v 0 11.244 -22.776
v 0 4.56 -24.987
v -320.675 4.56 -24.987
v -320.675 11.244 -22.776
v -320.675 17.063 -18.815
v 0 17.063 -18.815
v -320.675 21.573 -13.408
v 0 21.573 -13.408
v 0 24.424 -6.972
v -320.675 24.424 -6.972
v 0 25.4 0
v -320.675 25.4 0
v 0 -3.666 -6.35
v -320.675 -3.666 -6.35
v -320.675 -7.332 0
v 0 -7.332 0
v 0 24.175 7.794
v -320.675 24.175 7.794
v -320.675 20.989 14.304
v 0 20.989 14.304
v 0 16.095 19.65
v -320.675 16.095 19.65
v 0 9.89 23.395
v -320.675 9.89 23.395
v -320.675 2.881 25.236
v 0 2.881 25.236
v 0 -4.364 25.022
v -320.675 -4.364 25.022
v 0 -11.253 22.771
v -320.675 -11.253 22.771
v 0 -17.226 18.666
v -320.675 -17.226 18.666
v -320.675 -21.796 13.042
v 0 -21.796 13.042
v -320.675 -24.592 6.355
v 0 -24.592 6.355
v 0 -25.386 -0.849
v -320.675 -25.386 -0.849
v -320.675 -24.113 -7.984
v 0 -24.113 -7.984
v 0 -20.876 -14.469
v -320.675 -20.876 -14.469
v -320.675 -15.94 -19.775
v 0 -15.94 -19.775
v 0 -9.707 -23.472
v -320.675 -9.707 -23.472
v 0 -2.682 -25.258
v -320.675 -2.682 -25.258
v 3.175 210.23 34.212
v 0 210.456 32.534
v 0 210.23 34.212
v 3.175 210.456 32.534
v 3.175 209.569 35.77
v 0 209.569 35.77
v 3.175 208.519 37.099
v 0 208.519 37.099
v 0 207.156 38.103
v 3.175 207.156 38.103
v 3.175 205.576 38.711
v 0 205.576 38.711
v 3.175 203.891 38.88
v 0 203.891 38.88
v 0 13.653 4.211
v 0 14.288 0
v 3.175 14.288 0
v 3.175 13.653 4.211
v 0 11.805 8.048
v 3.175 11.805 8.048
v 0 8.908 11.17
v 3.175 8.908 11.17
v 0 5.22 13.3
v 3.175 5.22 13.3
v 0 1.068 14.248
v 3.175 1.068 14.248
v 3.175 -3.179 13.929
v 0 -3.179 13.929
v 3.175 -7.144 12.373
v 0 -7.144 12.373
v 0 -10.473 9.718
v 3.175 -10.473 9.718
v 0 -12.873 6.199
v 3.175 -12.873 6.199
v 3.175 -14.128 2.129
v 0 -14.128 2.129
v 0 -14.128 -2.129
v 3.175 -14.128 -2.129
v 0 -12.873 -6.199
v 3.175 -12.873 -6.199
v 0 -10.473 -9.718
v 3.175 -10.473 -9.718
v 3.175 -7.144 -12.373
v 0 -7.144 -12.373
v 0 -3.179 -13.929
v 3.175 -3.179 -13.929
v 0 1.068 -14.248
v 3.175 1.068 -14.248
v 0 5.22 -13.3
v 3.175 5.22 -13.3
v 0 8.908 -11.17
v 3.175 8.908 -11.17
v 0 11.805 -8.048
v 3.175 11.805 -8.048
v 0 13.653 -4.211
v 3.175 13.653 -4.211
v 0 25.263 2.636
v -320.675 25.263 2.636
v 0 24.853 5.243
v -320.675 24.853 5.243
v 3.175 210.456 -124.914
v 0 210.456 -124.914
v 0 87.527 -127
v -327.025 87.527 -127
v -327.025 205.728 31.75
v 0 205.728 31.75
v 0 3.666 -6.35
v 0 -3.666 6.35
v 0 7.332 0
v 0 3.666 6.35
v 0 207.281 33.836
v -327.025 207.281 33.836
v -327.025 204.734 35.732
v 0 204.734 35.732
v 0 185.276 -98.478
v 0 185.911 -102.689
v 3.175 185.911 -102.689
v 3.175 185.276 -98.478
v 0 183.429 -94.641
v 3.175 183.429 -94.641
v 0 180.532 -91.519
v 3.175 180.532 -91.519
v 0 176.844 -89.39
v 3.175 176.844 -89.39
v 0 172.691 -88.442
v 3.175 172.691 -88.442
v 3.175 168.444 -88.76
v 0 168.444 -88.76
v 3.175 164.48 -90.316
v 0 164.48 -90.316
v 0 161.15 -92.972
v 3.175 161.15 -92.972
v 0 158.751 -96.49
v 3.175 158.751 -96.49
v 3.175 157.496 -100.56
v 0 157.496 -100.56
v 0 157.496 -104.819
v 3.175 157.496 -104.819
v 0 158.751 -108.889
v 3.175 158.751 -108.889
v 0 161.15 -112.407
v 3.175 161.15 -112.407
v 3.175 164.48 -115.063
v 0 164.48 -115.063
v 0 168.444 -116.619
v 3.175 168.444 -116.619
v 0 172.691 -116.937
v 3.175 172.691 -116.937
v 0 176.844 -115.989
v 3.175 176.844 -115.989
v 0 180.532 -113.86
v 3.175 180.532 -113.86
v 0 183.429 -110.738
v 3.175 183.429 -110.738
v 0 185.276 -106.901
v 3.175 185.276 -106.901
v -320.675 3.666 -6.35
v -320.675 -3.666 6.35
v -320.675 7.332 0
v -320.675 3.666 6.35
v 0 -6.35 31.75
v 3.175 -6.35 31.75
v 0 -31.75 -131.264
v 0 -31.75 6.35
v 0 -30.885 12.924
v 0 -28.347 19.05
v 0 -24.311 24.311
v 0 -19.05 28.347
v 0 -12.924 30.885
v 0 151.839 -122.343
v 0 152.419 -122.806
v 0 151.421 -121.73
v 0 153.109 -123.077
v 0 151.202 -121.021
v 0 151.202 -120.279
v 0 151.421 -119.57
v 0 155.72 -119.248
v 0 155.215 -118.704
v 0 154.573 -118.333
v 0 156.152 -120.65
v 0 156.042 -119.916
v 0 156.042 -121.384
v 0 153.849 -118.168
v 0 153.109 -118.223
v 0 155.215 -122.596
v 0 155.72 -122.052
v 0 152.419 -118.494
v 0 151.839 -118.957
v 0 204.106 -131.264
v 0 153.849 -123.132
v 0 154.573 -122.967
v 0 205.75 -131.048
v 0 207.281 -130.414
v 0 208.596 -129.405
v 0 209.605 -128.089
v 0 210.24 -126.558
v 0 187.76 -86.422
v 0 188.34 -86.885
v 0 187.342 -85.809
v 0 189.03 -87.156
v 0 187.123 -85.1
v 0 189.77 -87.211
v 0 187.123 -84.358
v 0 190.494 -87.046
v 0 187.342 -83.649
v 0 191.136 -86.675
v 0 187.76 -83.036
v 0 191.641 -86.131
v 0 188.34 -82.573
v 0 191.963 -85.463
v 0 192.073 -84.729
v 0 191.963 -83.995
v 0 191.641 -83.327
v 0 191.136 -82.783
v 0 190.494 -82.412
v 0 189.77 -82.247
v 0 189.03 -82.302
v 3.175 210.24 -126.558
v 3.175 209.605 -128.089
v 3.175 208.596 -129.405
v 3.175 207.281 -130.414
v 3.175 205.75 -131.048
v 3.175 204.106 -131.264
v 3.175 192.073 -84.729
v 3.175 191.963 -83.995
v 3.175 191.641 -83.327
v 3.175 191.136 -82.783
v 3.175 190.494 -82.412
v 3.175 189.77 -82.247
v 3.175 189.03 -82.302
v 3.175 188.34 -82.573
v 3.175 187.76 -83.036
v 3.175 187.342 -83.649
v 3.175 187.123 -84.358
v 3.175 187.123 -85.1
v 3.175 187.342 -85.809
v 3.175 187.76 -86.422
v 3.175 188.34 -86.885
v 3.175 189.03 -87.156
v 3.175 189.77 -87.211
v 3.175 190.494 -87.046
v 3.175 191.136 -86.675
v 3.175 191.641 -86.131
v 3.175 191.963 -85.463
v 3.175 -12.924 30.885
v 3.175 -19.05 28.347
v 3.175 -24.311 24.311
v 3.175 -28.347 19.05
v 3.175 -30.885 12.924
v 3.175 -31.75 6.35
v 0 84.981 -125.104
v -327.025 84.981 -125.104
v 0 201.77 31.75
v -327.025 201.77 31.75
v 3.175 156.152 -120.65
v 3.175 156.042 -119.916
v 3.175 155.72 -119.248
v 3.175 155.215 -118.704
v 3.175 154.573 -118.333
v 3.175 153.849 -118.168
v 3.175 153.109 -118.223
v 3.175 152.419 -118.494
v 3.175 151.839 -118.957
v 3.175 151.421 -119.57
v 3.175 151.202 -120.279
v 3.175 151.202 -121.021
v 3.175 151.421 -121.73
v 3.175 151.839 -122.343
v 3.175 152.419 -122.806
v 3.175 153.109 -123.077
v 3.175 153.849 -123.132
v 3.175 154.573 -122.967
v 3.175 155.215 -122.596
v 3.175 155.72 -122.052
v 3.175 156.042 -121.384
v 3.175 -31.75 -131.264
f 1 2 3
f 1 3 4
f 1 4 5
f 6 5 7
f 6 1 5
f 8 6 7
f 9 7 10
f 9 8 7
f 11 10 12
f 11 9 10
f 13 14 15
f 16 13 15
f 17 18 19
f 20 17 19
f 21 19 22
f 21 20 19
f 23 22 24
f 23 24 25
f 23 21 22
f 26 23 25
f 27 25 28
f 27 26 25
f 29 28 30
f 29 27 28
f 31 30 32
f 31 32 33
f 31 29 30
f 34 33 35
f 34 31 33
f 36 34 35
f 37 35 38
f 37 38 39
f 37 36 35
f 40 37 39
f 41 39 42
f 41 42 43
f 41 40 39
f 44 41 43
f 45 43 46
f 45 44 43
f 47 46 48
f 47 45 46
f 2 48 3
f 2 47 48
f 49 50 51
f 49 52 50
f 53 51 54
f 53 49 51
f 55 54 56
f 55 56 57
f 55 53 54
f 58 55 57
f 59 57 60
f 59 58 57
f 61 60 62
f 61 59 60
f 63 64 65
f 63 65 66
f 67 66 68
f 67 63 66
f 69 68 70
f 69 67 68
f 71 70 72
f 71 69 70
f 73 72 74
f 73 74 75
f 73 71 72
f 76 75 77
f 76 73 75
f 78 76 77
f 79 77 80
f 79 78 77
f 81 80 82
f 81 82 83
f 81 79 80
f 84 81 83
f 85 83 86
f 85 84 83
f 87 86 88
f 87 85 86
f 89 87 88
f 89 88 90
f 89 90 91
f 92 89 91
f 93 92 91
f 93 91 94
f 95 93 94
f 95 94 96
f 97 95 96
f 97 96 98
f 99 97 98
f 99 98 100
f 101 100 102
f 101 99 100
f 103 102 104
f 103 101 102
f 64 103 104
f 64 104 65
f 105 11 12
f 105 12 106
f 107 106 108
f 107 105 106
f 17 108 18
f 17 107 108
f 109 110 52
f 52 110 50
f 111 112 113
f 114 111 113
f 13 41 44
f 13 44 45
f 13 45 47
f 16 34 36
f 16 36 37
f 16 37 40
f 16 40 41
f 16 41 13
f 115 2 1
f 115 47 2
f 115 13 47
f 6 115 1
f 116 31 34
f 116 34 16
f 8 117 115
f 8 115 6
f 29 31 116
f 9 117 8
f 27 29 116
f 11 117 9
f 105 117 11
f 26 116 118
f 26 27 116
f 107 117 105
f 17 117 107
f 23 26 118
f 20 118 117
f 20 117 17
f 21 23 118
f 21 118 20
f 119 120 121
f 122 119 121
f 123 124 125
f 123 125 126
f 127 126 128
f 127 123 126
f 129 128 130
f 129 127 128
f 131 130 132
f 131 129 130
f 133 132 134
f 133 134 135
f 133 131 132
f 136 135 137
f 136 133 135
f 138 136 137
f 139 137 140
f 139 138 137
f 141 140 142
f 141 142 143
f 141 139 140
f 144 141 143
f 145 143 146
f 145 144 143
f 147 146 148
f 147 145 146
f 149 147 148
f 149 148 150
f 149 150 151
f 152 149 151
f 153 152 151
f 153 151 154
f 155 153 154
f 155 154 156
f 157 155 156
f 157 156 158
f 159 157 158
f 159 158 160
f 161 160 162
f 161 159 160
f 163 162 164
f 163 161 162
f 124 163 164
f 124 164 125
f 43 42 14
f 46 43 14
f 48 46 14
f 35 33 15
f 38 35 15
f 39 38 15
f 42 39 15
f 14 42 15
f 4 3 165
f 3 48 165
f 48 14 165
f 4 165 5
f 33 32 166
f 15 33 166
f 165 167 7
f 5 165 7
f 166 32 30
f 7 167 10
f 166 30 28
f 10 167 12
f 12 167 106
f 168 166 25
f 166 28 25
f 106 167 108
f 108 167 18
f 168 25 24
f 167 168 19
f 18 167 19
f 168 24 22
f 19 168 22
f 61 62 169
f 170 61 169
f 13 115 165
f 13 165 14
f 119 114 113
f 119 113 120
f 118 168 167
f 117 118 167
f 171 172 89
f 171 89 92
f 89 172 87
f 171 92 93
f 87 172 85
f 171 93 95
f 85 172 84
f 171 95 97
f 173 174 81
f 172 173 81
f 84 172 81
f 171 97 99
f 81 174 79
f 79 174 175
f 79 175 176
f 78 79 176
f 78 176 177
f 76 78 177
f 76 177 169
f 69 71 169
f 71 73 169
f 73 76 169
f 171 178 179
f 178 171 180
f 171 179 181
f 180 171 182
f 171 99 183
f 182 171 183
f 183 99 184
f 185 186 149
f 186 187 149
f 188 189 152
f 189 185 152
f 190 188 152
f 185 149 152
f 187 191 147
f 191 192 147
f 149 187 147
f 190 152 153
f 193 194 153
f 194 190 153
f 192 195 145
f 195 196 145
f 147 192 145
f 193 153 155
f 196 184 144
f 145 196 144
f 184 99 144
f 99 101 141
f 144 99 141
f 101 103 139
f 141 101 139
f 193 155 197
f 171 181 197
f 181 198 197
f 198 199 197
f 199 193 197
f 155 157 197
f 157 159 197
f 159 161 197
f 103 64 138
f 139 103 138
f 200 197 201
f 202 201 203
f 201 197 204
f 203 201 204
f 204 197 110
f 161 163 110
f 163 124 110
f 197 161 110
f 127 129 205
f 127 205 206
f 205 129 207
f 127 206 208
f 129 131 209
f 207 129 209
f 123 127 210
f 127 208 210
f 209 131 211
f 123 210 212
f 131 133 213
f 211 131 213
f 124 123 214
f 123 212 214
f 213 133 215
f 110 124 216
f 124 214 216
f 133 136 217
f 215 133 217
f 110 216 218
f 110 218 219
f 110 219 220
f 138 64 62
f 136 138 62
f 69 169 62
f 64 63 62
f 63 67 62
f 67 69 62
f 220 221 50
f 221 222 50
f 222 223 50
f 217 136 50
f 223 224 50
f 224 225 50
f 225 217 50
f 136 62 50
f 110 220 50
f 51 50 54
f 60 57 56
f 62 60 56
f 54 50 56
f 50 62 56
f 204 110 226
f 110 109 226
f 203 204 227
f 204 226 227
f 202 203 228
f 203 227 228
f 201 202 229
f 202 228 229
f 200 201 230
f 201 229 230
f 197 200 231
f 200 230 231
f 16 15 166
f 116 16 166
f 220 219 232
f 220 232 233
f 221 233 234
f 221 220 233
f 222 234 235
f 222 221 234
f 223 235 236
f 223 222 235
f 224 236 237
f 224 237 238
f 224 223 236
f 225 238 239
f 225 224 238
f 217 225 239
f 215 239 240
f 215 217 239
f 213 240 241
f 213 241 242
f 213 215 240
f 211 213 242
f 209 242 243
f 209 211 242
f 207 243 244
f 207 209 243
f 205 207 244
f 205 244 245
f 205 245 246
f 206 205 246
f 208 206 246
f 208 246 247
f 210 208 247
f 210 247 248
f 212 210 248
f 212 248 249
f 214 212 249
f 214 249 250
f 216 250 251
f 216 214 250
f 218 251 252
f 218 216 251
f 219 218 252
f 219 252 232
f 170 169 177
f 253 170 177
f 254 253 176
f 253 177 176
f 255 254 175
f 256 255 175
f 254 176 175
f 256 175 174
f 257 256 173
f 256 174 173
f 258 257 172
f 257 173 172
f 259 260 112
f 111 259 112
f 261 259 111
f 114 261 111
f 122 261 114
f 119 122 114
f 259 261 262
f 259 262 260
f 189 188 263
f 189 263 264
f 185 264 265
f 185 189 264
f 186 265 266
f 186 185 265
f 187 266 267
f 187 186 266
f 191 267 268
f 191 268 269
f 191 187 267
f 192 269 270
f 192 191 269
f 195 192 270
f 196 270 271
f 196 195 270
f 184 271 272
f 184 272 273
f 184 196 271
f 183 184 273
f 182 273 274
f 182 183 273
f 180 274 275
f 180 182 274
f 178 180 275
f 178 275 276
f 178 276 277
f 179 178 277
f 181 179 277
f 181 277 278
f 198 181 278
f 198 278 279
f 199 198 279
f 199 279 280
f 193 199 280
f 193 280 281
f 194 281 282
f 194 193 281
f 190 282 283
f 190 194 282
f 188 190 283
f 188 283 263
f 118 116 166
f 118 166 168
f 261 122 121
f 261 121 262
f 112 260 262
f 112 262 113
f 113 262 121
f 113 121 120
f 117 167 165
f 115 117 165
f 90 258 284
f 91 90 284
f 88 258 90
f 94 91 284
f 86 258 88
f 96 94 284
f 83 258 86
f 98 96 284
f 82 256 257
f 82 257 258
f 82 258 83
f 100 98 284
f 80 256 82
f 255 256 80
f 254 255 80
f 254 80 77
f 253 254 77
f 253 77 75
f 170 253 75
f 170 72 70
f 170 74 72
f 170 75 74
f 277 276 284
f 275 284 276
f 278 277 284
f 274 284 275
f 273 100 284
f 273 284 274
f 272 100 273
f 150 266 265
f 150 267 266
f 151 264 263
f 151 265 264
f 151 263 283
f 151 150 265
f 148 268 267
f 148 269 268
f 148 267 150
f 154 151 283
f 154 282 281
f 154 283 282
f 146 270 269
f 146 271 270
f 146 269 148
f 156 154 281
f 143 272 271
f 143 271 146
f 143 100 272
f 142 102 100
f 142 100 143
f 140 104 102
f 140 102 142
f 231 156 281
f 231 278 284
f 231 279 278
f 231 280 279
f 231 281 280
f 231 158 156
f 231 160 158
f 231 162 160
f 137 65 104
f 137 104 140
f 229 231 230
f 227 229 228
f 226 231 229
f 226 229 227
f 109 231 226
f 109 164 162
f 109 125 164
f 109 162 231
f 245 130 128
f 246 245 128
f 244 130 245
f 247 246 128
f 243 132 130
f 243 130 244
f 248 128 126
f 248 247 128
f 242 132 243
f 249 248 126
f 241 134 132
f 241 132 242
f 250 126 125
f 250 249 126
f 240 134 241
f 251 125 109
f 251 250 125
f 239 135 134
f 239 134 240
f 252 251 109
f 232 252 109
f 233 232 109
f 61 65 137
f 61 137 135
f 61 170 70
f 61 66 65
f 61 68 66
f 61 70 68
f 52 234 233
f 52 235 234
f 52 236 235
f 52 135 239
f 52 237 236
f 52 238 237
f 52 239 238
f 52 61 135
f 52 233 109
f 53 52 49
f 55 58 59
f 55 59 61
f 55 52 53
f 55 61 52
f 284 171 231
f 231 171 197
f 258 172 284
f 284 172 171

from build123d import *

# Parameters (mm, degrees)
F0_R     = 2.4892
F0_R_2   = 14.2875
F1_DEPTH = 3.175
F2_DEPTH = 320.675
F3_DEPTH = 327.025
F5_R     = 6.35


# Not quite as in the source:
# - the program builds the solid bodies; features that only make, move or delete a surface that nothing else refers to are left out


with BuildPart() as f1:
    # F0 (on Right) → F1 (new body)
    with BuildSketch(Plane.YZ):
        with BuildLine():
            ThreePointArc((4.5600132785, -24.9873223635), (-21.7962589324, 13.0415910284), (24.1745661853, 7.7942510707))
            Line((24.1745661853, 7.7942510707), (134.6951456058, -58.3347209468))
            Line((134.6951456058, -58.3347209468), (201.7698075546, 31.75))
            Line((201.7698075546, 31.75), (-6.35, 31.75))
            ThreePointArc((-6.35, 31.75), (-24.3105122421, 24.3105122421), (-31.75, 6.35))
            Line((-31.75, 6.35), (-31.75, -131.2644877579))
            Line((-31.75, -131.2644877579), (210.4560597146, -131.2644877579))
            Line((210.4560597146, -131.2644877579), (210.4560597146, 31.75))
            Line((210.4560597146, 31.75), (205.7282433529, 31.75))
            Line((205.7282433529, 31.75), (137.4335839182, -59.9732403202))
            Line((137.4335839182, -59.9732403202), (181.4310192869, -86.2987010407))
            ThreePointArc((181.4310192869, -86.2987010407), (188.0145295507, -112.4967642112), (161.8164663801, -119.080274475))
            Line((161.8164663801, -119.080274475), (114.5027408261, -90.7705420286))
            Line((114.5027408261, -90.7705420286), (87.5272601843, -127))
            Line((87.5272601843, -127), (84.9806418952, -125.1038564691))
            Line((84.9806418952, -125.1038564691), (111.7643025136, -89.1320226553))
            Line((111.7643025136, -89.1320226553), (4.5600132785, -24.9873223635))
        make_face()
        with Locations((153.6632305914, -120.65)):
            Circle(F0_R, mode=Mode.SUBTRACT)
        with Locations((189.5842550757, -84.7289755157)):
            Circle(F0_R, mode=Mode.SUBTRACT)
        with BuildLine():
            ThreePointArc((24.1745661853, 7.7942510707), (25.0917713714, 3.9449980288), (25.4, 0))
            ThreePointArc((25.4, 0), (19.5062084639, -16.2686149184), (4.5600132785, -24.9873223635))
            Line((4.5600132785, -24.9873223635), (111.7643025136, -89.1320226553))
            Line((111.7643025136, -89.1320226553), (134.6951456058, -58.3347209468))
            Line((134.6951456058, -58.3347209468), (24.1745661853, 7.7942510707))
        make_face()
        with BuildLine():
            Line((9.8072764534, 16.3907867171), (24.1745661853, 7.7942510707))
            ThreePointArc((24.1745661853, 7.7942510707), (-21.7962589324, 13.0415910284), (4.5600132785, -24.9873223635))
            Line((4.5600132785, -24.9873223635), (-9.8072764534, -16.3907867171))
            ThreePointArc((-9.8072764534, -16.3907867171), (-16.3907867171, 9.8072764534), (9.8072764534, 16.3907867171))
        make_face()
        with BuildLine():
            ThreePointArc((4.5600132785, -24.9873223635), (19.5062084639, -16.2686149184), (25.4, 0))
            ThreePointArc((25.4, 0), (25.0917713714, 3.9449980288), (24.1745661853, 7.7942510707))
            Line((24.1745661853, 7.7942510707), (9.8072764534, 16.3907867171))
            ThreePointArc((9.8072764534, 16.3907867171), (-16.3907867171, 9.8072764534), (-9.8072764534, -16.3907867171))
            Line((-9.8072764534, -16.3907867171), (4.5600132785, -24.9873223635))
        make_face()
        Circle(F0_R_2, mode=Mode.SUBTRACT)
        Polygon((114.5027408261, -90.7705420286), (111.7643025136, -89.1320226553), (84.9806418952, -125.1038564691), (87.5272601843, -127), align=None)
        Polygon((137.4335839182, -59.9732403202), (134.6951456058, -58.3347209468), (111.7643025136, -89.1320226553), (114.5027408261, -90.7705420286), align=None)
        Polygon((201.7698075546, 31.75), (134.6951456058, -58.3347209468), (137.4335839182, -59.9732403202), (205.7282433529, 31.75), align=None)
        Polygon((204.7344414256, 35.731655773), (201.7698075546, 31.75), (205.7282433529, 31.75), (207.2810597146, 33.8355122421), align=None)
        with BuildLine():
            Line((181.4310192869, -86.2987010407), (137.4335839182, -59.9732403202))
            Line((137.4335839182, -59.9732403202), (114.5027408261, -90.7705420286))
            Line((114.5027408261, -90.7705420286), (161.8164663801, -119.080274475))
            ThreePointArc((161.8164663801, -119.080274475), (188.0145295507, -112.4967642112), (181.4310192869, -86.2987010407))
        make_face()
        with Locations((171.6237428335, -102.6894877579)):
            Circle(F0_R_2, mode=Mode.SUBTRACT)
        Polygon((-6.35, 31.75), (201.7698075546, 31.75), (204.7344414256, 35.731655773), (207.2810597146, 33.8355122421), (205.7282433529, 31.75), (210.4560597146, 31.75), (210.4560597146, 39.1025175512), align=None)
    extrude(amount=F1_DEPTH)

    # F5
    f5_edges = [f1.edges().sort_by_distance(p)[0] for p in [
        (1.5875, -6.35, 31.75),
        (1.5875, 210.45606, -131.264488),
        (1.5875, 210.45606, 39.102518),
    ]]
    fillet(f5_edges, radius=F5_R)


with BuildPart() as f2:
    # F0 (on Right) → F2 (new body)
    with BuildSketch(Plane.YZ):
        with BuildLine():
            ThreePointArc((4.5600132785, -24.9873223635), (19.5062084639, -16.2686149184), (25.4, 0))
            ThreePointArc((25.4, 0), (25.0917713714, 3.9449980288), (24.1745661853, 7.7942510707))
            Line((24.1745661853, 7.7942510707), (9.8072764534, 16.3907867171))
            ThreePointArc((9.8072764534, 16.3907867171), (-16.3907867171, 9.8072764534), (-9.8072764534, -16.3907867171))
            Line((-9.8072764534, -16.3907867171), (4.5600132785, -24.9873223635))
        make_face()
        Circle(F0_R_2, mode=Mode.SUBTRACT)
        Circle(F0_R_2)
        Polygon((-7.3323484187, 0), (-3.6661742094, 6.35), (3.6661742094, 6.35), (7.3323484187, 0), (3.6661742094, -6.35), (-3.6661742094, -6.35), align=None, mode=Mode.SUBTRACT)
        with BuildLine():
            Line((9.8072764534, 16.3907867171), (24.1745661853, 7.7942510707))
            ThreePointArc((24.1745661853, 7.7942510707), (-21.7962589324, 13.0415910284), (4.5600132785, -24.9873223635))
            Line((4.5600132785, -24.9873223635), (-9.8072764534, -16.3907867171))
            ThreePointArc((-9.8072764534, -16.3907867171), (-16.3907867171, 9.8072764534), (9.8072764534, 16.3907867171))
        make_face()
    extrude(amount=-F2_DEPTH)


with BuildPart() as f3:
    # F0 (on Right) → F3 (new body)
    with BuildSketch(Plane.YZ):
        Polygon((114.5027408261, -90.7705420286), (111.7643025136, -89.1320226553), (84.9806418952, -125.1038564691), (87.5272601843, -127), align=None)
        Polygon((137.4335839182, -59.9732403202), (134.6951456058, -58.3347209468), (111.7643025136, -89.1320226553), (114.5027408261, -90.7705420286), align=None)
        Polygon((201.7698075546, 31.75), (134.6951456058, -58.3347209468), (137.4335839182, -59.9732403202), (205.7282433529, 31.75), align=None)
        Polygon((204.7344414256, 35.731655773), (201.7698075546, 31.75), (205.7282433529, 31.75), (207.2810597146, 33.8355122421), align=None)
    extrude(amount=-F3_DEPTH)


solid = Compound([f1.part, f2.part, f3.part])
